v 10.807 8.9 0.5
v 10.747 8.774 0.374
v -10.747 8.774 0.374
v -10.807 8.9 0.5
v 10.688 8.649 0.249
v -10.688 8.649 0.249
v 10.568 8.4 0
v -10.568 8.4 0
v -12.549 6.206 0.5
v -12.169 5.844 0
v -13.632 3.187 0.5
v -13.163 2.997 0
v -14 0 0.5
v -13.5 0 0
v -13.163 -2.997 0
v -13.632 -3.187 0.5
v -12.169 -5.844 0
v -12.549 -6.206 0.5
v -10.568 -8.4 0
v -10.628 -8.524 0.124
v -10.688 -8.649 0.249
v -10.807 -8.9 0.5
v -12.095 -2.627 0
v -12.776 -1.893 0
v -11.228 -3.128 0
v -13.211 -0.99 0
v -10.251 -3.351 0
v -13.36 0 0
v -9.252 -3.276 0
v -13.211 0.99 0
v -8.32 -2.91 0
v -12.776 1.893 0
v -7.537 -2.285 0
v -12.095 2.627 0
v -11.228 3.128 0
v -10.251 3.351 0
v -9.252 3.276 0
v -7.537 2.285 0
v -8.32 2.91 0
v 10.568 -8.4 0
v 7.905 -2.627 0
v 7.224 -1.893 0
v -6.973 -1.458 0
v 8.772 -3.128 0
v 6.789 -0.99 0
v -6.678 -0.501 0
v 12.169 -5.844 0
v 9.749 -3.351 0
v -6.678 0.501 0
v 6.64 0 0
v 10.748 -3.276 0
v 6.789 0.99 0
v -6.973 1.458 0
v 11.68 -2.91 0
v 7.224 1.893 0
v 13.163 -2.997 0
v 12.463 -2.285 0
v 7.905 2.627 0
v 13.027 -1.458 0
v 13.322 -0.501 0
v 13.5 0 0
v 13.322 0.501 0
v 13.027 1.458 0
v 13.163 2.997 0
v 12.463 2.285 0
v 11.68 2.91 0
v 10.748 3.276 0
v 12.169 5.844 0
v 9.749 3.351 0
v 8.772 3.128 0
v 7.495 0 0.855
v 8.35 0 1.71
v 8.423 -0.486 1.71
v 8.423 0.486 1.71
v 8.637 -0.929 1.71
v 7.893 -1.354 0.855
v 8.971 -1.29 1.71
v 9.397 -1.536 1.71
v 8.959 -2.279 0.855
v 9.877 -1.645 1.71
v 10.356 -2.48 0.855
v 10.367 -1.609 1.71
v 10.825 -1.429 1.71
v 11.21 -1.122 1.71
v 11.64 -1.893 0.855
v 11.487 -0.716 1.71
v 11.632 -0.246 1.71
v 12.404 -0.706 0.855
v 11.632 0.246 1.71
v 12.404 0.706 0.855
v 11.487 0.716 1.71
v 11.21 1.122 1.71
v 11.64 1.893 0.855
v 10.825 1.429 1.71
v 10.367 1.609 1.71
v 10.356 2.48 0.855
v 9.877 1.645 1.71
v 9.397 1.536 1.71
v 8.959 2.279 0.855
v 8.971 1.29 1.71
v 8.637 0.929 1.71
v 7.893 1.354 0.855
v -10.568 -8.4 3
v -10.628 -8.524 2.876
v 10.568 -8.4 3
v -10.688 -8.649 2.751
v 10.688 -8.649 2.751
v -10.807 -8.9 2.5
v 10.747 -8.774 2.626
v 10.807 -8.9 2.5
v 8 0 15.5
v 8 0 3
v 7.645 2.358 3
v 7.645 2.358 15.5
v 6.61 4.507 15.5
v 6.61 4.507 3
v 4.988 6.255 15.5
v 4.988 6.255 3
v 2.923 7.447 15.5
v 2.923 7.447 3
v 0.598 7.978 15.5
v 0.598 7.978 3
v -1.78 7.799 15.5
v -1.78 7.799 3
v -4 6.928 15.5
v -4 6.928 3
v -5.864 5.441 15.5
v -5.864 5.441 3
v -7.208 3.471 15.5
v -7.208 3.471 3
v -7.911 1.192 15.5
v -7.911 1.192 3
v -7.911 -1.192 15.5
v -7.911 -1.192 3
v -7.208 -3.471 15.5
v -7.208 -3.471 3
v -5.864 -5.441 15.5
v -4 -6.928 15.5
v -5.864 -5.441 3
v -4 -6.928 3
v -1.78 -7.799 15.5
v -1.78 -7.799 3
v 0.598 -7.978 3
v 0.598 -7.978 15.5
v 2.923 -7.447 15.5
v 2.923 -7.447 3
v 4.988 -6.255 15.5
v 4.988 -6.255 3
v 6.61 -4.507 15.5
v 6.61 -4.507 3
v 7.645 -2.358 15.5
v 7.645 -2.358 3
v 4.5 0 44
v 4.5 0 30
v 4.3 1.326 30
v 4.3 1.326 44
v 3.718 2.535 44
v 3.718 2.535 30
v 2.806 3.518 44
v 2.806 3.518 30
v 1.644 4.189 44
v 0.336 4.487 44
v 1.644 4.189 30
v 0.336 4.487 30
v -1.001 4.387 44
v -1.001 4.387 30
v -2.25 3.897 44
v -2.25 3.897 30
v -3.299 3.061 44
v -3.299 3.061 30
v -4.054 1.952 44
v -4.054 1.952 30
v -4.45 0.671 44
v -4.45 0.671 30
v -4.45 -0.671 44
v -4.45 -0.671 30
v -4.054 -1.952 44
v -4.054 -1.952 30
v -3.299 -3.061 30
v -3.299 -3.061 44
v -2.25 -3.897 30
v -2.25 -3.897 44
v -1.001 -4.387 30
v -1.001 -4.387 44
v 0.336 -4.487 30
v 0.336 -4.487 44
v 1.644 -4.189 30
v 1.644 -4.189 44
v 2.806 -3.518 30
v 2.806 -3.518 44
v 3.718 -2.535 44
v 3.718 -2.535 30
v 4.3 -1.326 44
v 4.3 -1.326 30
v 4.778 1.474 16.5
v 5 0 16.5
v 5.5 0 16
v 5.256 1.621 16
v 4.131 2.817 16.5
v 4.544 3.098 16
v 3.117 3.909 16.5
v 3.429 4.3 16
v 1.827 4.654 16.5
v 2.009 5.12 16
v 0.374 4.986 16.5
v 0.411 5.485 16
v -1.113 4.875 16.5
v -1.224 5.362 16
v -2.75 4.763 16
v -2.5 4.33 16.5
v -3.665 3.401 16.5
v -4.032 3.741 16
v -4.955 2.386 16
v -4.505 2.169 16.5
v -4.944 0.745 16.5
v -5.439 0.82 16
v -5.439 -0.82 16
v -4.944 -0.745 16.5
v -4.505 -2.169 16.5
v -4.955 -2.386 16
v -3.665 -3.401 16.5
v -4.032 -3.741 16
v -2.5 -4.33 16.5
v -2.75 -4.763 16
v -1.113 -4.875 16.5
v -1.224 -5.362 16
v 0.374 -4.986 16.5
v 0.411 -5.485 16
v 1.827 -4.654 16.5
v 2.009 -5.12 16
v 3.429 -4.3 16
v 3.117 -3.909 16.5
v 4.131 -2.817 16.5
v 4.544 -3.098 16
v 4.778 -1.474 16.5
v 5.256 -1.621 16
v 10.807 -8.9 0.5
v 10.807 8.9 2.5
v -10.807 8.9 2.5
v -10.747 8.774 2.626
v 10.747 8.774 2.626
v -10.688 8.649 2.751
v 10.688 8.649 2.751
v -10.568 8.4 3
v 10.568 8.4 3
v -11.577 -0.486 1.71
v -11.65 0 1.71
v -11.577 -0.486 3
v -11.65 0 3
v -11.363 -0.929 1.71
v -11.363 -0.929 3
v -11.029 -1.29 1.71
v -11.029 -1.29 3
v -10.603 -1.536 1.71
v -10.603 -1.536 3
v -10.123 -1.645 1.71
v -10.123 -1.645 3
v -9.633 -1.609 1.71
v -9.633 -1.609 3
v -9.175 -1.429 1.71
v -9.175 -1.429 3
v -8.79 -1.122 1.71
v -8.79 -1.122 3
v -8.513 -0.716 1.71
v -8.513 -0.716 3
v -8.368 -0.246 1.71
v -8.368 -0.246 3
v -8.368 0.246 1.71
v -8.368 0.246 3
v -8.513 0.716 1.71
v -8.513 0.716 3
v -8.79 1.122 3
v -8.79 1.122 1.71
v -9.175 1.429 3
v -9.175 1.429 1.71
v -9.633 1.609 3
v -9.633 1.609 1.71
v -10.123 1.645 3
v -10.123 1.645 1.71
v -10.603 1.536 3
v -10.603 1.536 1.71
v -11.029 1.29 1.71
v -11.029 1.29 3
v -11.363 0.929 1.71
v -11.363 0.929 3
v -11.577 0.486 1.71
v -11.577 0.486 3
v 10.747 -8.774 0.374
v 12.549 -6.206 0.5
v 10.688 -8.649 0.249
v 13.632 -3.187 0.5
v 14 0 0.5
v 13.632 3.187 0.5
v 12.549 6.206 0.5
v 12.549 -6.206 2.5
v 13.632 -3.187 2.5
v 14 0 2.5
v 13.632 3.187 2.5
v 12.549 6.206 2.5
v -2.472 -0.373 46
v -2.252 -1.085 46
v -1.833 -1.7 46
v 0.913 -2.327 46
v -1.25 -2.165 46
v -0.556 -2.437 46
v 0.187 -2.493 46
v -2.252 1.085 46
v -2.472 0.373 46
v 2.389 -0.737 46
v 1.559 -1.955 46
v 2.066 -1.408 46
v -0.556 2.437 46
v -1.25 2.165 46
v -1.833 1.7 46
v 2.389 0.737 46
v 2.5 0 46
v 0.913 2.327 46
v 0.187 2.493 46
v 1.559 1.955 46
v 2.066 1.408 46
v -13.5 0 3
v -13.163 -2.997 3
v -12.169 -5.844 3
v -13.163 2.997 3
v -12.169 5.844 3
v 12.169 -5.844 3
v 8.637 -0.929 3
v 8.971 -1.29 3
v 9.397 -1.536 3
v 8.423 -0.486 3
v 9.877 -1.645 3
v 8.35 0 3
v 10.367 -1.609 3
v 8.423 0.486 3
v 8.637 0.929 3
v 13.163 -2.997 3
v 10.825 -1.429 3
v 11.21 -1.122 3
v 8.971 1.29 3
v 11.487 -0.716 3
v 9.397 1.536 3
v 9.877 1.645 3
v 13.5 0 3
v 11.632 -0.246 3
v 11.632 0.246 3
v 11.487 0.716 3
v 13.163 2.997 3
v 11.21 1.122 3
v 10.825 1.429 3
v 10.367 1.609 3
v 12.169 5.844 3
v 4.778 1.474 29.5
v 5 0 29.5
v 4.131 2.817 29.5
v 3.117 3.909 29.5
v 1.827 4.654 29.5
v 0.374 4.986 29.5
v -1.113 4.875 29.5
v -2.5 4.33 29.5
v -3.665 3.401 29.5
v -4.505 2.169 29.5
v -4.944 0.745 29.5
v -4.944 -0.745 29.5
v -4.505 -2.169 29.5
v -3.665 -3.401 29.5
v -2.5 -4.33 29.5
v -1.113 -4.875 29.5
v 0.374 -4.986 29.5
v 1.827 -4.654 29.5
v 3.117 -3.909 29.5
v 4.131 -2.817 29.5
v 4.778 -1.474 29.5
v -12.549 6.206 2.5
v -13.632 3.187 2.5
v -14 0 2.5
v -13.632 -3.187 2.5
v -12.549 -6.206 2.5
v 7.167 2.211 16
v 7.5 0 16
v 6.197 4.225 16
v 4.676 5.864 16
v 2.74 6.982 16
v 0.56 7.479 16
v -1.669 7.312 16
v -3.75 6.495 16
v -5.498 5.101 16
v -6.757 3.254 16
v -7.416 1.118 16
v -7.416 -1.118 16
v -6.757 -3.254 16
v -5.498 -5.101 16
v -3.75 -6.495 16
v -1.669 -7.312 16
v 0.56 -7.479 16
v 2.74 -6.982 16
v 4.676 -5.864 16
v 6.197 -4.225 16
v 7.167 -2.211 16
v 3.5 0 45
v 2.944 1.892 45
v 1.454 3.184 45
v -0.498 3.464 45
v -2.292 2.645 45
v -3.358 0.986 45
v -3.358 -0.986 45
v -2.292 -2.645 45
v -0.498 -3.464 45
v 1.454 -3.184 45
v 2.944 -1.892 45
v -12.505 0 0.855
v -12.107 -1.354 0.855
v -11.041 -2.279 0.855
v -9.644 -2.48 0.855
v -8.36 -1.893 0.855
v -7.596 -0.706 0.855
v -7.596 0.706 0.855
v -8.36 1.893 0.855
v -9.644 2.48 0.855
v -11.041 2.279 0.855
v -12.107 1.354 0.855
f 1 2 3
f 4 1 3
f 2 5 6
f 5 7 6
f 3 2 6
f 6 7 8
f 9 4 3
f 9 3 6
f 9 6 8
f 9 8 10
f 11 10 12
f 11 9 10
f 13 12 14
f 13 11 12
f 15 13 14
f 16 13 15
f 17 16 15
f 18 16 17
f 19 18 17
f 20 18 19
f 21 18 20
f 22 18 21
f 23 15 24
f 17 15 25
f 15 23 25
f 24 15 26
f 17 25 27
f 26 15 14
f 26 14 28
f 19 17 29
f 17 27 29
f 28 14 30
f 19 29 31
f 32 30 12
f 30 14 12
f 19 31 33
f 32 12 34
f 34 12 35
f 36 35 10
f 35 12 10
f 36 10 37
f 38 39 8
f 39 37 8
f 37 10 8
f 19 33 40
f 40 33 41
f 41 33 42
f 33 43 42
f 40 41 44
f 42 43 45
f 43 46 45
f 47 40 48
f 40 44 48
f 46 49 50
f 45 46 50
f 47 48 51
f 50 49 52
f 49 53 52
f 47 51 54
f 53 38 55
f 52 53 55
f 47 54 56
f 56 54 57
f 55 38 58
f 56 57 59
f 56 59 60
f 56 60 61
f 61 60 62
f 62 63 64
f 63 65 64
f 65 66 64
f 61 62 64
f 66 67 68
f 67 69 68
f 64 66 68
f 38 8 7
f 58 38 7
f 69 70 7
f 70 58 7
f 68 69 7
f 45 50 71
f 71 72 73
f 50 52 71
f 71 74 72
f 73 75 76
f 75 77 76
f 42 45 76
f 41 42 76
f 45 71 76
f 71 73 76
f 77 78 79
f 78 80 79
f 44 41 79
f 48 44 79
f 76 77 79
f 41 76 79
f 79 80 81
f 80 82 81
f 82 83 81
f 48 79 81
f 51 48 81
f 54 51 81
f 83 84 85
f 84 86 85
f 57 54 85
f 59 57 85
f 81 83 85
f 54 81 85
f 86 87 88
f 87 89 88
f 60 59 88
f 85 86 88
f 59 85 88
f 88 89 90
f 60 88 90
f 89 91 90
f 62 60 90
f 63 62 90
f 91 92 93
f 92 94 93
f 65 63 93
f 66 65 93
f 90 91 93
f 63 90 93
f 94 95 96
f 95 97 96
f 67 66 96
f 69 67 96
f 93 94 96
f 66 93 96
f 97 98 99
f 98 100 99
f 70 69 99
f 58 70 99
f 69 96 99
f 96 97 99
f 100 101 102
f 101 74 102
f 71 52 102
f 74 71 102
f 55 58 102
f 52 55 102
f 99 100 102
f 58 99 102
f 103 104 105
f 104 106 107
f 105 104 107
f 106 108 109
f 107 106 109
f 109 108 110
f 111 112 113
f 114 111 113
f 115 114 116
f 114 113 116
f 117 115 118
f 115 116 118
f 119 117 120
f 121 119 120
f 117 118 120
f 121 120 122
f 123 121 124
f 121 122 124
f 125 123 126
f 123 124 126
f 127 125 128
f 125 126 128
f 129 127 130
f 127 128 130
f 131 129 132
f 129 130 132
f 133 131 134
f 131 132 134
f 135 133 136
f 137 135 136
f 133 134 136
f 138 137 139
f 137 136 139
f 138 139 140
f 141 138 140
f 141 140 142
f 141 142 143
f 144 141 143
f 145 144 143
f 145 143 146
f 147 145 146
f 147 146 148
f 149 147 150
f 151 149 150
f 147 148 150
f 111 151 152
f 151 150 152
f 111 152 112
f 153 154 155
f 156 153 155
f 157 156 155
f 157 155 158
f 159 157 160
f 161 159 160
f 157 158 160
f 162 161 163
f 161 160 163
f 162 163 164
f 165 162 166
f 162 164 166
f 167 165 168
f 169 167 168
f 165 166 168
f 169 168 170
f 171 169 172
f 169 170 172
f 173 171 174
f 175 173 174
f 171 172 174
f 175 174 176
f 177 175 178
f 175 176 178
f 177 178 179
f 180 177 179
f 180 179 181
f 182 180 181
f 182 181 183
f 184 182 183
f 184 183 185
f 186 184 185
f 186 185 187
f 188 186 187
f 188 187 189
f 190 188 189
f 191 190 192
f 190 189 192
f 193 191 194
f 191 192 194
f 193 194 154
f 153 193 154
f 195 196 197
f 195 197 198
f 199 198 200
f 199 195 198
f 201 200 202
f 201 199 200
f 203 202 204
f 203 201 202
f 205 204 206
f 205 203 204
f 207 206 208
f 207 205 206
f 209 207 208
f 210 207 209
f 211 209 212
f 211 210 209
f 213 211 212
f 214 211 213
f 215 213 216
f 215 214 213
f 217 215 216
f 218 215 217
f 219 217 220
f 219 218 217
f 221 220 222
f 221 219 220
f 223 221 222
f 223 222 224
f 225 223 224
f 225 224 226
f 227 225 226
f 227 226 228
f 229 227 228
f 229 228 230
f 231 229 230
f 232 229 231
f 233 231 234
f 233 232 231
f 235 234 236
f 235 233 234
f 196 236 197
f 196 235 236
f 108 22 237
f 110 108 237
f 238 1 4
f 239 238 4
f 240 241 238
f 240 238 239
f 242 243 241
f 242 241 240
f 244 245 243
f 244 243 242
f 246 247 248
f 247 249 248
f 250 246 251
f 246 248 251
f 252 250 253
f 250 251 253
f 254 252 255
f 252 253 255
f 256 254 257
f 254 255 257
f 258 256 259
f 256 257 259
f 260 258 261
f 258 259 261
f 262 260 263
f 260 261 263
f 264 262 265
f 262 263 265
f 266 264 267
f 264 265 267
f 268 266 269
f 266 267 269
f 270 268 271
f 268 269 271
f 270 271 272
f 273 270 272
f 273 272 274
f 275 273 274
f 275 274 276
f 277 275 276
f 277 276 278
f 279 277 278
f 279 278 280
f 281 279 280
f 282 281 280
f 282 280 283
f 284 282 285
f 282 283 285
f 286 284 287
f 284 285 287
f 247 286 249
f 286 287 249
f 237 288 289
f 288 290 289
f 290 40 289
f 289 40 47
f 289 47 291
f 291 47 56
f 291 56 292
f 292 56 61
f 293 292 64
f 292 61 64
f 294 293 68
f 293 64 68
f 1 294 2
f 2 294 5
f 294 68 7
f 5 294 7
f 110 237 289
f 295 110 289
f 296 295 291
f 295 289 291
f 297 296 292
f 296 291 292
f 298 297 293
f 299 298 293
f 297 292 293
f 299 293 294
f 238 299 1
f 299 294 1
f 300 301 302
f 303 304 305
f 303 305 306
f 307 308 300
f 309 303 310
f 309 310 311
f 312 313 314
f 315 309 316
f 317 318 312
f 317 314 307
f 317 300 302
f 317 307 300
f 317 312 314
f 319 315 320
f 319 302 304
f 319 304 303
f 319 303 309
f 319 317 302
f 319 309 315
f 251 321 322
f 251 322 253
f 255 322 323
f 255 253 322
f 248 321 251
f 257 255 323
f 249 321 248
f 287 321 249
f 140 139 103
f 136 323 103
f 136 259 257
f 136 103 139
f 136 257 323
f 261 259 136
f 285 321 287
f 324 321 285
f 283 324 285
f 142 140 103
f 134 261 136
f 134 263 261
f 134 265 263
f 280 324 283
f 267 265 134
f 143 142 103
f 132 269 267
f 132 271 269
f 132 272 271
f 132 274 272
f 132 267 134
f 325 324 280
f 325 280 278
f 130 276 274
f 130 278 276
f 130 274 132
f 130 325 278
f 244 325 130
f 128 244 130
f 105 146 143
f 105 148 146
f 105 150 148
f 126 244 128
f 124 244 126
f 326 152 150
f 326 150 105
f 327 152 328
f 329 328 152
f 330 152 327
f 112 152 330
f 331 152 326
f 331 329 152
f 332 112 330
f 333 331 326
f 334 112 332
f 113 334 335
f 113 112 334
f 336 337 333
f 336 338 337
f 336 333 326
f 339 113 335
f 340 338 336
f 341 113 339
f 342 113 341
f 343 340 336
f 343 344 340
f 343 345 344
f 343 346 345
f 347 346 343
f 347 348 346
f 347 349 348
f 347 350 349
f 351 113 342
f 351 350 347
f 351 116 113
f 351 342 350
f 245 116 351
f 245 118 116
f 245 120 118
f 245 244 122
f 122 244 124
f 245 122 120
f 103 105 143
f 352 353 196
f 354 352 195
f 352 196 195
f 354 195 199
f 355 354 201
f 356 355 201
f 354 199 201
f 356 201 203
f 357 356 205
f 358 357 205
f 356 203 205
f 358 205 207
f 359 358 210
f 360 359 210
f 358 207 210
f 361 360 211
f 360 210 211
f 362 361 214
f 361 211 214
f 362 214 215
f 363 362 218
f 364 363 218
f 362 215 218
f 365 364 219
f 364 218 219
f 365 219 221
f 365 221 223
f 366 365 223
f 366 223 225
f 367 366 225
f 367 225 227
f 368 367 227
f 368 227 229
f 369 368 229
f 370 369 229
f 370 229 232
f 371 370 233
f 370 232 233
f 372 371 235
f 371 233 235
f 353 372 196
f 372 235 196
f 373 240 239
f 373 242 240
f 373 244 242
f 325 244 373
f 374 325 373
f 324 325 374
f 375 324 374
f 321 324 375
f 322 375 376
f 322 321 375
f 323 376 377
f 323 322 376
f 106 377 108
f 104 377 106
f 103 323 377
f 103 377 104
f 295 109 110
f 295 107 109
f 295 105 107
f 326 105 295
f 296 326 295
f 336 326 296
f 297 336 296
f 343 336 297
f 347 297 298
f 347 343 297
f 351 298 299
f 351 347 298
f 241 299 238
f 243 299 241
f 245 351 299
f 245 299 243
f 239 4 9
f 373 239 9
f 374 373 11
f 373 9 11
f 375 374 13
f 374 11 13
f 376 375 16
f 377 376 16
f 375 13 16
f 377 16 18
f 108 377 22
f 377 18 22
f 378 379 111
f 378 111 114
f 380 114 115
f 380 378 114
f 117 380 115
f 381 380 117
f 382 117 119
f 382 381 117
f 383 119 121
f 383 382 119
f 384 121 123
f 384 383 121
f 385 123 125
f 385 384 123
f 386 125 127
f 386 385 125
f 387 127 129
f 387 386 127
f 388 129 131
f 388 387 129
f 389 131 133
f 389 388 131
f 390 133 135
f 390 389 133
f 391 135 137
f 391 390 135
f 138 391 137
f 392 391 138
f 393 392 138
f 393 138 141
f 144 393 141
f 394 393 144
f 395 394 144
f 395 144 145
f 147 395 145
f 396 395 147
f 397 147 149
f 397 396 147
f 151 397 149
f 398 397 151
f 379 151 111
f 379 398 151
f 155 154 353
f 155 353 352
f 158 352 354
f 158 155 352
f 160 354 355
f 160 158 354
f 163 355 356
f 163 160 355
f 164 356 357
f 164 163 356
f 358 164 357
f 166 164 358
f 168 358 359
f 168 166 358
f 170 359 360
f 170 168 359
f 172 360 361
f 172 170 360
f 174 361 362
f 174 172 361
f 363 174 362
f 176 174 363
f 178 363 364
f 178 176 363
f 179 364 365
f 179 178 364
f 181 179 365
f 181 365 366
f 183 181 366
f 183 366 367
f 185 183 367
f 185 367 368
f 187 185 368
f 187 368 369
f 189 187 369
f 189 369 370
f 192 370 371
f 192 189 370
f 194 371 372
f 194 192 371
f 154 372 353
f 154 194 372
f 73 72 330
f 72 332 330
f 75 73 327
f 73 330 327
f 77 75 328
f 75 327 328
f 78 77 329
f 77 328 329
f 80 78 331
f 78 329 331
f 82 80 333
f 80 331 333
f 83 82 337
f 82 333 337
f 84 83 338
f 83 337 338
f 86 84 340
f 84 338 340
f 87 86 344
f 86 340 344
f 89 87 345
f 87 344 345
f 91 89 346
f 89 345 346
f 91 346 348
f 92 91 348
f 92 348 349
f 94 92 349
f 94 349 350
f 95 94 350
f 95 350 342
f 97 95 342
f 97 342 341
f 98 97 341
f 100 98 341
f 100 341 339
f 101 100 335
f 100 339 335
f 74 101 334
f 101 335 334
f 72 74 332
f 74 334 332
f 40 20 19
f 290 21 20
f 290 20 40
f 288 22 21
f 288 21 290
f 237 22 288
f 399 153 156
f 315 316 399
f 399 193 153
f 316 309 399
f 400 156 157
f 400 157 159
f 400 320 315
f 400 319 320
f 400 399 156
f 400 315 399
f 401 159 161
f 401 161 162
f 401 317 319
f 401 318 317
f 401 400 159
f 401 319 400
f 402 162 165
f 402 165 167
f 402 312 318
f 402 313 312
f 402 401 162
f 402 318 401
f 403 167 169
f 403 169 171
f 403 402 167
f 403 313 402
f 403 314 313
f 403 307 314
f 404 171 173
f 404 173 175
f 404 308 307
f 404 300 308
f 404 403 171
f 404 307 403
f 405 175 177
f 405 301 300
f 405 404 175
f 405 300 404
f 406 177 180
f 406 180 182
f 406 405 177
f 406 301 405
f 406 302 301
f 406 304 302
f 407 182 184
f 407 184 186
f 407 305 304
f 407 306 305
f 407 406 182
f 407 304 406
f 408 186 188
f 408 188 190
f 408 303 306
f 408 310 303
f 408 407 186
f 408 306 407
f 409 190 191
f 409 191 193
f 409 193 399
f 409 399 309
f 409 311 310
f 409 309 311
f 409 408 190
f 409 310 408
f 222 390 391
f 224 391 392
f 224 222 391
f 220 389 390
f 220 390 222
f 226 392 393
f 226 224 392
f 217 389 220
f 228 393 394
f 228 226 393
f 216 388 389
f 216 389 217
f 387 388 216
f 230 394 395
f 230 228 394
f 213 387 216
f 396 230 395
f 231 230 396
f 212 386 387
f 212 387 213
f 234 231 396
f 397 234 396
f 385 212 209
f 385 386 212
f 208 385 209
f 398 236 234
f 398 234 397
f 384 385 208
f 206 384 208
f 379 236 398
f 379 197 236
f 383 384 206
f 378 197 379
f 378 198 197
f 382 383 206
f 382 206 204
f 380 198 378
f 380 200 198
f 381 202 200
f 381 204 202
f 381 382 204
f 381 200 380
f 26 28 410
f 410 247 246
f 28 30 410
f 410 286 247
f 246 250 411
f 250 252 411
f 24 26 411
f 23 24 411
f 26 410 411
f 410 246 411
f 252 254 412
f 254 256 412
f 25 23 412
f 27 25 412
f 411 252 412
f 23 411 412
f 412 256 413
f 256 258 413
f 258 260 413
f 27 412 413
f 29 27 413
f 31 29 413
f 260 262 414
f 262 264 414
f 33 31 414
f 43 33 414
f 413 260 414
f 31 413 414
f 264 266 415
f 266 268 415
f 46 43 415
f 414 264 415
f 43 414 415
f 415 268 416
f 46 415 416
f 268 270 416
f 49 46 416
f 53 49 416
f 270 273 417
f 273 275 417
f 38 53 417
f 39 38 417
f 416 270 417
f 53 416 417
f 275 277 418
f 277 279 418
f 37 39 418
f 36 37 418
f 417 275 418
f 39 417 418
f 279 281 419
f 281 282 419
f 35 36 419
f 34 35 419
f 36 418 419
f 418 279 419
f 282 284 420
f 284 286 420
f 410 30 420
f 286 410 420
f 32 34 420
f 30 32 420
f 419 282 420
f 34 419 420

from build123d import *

# Parameters (mm, degrees)
F1_DEPTH       = 3
F3_D           = 3.3
F3_CSINK_D     = 6.72
F3_CSINK_ANGLE = 90
F4_R           = 8
F5_DEPTH       = 13
F6_SIZE2       = 0.5
F6_SIZE        = 0.5
F7_R           = 5
F8_DEPTH       = 14
F9_R           = 4.5
F10_DEPTH      = 16
F11_SIZE2      = 0.49999
F11_SIZE       = 0.49999
F12_SIZE2      = 2
F12_SIZE       = 2


# Not quite as in the source:
# - a fillet or chamfer is up to 0.001 mm smaller than in the source, because OpenCascade refuses the exact size


with BuildPart() as f1:
    # F0 (on Top) → F1 (new body)
    with BuildSketch(Plane.XY):
        with BuildLine():
            Line((10.8069422132, 8.9), (-10.8069422132, 8.9))
            ThreePointArc((-10.8069422132, 8.9), (-14, 0), (-10.8069422132, -8.9))
            Line((-10.8069422132, -8.9), (10.8069422132, -8.9))
            ThreePointArc((10.8069422132, -8.9), (14, 0), (10.8069422132, 8.9))
        make_face()
    extrude(amount=F1_DEPTH)

    # F3 (through all)
    with Locations(Plane(origin=(0, 0, 0), x_dir=(1, 0, 0), z_dir=(0, 0, -1))):
        with Locations((-10, 0), (10, 0)):
            CounterSinkHole(F3_D / 2, F3_CSINK_D / 2, counter_sink_angle=F3_CSINK_ANGLE)

    # F4 (on face) → F5 (join)
    with BuildSketch(Plane.XY.offset(3)):
        Circle(F4_R)
    extrude(amount=F5_DEPTH)

    # F6
    f6_edges = [f1.edges().sort_by_distance(p)[0] for p in [
        (0, 8.9, 3),
        (14, 0, 3),
        (0, -8.9, 3),
        (-14, 0, 3),
    ]]
    chamfer(f6_edges, length=F6_SIZE, length2=F6_SIZE2)

    # F7 (on face) → F8 (join)
    with BuildSketch(Plane.XY.offset(16)):
        Circle(F7_R)
    extrude(amount=F8_DEPTH)

    # F9 (on face) → F10 (join)
    with BuildSketch(Plane.XY.offset(30)):
        Circle(F9_R)
    extrude(amount=F10_DEPTH)

    # F11 (size 0.5 and 0.5 in the source; OpenCascade refuses exactly that, so slightly less here)
    f11_edges = [f1.edges().sort_by_distance(p)[0] for p in [
        (-5, 0, 30),
        (-8, 0, 16),
        (-5, 0, 16),
        (0, 8.9, 0),
        (14, 0, 0),
        (-14, 0, 0),
        (0, -8.9, 0),
    ]]
    chamfer(f11_edges, length=F11_SIZE, length2=F11_SIZE2)

    # F12
    f12_edges = [f1.edges().sort_by_distance(p)[0] for p in [
        (-4.5, 0, 46),
    ]]
    chamfer(f12_edges, length=F12_SIZE, length2=F12_SIZE2)


solid = f1.part
